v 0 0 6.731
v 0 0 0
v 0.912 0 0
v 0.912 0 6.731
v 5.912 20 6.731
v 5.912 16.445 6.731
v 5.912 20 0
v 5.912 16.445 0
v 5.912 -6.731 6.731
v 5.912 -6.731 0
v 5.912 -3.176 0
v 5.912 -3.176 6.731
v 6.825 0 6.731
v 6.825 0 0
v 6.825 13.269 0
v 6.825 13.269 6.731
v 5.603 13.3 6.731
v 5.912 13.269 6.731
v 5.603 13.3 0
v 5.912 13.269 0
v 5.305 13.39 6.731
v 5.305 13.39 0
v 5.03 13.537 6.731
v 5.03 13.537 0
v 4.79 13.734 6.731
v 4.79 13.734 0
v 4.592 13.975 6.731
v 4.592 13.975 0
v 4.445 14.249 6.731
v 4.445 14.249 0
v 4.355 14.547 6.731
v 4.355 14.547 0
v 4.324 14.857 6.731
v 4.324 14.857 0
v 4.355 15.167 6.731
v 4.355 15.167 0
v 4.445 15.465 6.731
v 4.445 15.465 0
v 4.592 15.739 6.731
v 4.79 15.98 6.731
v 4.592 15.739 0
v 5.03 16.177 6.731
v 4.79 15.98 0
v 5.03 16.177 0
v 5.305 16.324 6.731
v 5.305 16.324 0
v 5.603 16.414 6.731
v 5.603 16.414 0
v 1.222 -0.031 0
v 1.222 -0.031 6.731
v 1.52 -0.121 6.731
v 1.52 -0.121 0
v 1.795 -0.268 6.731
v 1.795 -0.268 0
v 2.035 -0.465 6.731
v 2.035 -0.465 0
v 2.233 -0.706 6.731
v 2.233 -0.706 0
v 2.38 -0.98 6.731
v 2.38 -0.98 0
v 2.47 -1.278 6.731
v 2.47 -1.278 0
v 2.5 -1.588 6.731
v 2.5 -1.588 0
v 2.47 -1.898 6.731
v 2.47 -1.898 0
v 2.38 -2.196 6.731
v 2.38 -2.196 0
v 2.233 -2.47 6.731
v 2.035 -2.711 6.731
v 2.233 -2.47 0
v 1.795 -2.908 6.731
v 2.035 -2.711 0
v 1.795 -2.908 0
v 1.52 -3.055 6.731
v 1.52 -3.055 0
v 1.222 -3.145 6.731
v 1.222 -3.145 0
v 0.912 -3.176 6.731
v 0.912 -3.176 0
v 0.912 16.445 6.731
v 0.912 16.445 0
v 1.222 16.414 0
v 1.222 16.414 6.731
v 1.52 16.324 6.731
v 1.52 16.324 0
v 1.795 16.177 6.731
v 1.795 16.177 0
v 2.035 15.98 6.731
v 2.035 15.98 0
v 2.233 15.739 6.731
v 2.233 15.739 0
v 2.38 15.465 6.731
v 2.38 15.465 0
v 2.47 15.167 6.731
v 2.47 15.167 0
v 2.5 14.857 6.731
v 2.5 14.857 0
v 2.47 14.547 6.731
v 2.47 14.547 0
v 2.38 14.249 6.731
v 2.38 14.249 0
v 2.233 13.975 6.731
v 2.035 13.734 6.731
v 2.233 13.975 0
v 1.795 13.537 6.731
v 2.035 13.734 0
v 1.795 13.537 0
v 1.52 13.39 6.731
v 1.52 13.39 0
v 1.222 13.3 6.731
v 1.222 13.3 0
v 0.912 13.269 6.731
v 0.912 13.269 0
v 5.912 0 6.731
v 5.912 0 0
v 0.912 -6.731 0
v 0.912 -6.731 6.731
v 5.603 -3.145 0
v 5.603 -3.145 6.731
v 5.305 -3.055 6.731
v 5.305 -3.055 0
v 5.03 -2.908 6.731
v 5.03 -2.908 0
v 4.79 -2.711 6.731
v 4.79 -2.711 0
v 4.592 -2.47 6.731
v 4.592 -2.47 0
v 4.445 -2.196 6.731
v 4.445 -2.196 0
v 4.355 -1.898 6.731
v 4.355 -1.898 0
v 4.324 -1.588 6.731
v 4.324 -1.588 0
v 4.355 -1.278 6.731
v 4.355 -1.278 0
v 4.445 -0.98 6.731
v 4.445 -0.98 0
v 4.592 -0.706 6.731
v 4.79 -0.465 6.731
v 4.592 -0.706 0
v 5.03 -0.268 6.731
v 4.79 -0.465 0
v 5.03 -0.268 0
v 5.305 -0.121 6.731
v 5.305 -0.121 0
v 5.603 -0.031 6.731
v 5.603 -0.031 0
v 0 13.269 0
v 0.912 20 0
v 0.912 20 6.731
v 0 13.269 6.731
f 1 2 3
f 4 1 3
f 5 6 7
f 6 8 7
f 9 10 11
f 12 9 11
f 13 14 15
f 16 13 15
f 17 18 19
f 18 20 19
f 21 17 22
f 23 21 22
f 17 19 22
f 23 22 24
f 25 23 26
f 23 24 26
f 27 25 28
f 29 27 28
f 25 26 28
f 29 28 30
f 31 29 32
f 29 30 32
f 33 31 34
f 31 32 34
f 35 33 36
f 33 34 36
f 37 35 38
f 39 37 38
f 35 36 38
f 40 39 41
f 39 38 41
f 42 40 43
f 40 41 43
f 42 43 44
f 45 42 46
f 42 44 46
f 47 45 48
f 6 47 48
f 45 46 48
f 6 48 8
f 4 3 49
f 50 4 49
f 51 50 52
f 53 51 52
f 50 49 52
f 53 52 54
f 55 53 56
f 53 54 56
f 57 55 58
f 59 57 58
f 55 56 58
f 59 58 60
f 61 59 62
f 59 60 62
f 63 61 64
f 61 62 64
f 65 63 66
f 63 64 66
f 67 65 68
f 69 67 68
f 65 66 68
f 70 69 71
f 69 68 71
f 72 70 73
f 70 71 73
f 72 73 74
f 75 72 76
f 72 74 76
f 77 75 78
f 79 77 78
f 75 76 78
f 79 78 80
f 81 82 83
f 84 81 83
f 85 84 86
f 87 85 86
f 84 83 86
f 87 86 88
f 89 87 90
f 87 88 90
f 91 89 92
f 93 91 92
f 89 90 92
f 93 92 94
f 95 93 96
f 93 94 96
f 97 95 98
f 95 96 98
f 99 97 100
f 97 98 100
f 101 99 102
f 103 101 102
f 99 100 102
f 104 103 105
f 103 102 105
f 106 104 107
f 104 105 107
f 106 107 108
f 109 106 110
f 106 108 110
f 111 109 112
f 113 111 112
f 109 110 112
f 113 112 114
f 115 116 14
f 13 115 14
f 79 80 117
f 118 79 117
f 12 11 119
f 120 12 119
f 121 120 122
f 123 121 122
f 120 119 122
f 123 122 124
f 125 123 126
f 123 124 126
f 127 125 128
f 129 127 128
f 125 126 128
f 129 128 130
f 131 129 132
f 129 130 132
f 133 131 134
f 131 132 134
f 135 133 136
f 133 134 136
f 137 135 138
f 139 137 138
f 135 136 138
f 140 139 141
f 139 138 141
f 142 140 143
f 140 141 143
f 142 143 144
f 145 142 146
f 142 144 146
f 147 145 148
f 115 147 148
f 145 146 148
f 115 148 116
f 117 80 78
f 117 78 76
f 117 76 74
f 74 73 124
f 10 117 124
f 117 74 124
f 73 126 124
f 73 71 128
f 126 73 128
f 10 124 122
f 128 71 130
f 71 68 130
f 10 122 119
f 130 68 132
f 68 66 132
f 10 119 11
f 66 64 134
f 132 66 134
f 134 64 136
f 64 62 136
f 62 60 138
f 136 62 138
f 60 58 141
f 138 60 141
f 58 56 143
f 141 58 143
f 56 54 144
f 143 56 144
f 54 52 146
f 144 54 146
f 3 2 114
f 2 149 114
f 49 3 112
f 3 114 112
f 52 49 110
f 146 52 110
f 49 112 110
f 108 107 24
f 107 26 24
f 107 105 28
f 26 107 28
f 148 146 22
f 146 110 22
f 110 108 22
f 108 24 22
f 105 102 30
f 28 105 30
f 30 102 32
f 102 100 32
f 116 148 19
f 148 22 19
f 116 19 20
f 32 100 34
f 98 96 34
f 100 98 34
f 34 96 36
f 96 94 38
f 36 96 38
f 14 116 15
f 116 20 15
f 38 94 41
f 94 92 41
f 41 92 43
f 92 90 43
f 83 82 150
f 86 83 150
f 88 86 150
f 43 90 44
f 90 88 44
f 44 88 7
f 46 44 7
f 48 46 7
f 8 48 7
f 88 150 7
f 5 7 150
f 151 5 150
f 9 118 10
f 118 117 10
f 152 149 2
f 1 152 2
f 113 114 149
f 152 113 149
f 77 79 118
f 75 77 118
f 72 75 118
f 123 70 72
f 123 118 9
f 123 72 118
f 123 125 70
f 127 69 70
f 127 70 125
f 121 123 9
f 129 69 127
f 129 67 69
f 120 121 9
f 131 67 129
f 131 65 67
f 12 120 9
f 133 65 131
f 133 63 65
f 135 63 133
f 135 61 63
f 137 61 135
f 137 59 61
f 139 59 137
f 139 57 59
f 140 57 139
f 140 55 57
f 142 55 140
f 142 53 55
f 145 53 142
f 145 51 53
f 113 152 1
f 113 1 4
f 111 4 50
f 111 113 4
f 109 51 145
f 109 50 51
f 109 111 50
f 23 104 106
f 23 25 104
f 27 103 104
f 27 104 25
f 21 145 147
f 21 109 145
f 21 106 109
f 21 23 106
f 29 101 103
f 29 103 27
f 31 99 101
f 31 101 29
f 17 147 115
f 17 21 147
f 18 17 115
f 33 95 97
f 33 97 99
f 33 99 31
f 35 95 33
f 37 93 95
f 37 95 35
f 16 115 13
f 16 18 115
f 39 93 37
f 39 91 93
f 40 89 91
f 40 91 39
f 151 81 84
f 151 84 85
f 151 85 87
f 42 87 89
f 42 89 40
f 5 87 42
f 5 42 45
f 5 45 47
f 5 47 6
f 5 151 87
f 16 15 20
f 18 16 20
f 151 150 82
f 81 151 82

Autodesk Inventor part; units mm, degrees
ref_plane "YZ Plane" through (0, 0, 0) normal (1, 0, 0) x (0, 1, 0)
ref_plane "XZ Plane" through (0, 0, 0) normal (0, 1, 0) x (-1, 0, 0)
ref_plane "XY Plane" through (0, 0, 0) normal (0, 0, 1) x (1, 0, 0)
sketch "Sketch1" plane through (0, 0, 0) normal (0, 0, 1) x (1, 0, 0)
  line L0 (0, 0) -> (0.9125, 0)
  line L1 (0.9125, 0) -> (0.9125, -6.731)
  line L2 (0.9125, -6.731) -> (5.9125, -6.731)
  line L3 (5.9125, -6.731) -> (5.9125, 0)
  line L4 (5.9125, 0) -> (6.825, 0)
  line L5 (6.825, 0) -> (6.825, 13.269)
  line L6 (6.825, 13.269) -> (5.9125, 13.269)
  line L7 (5.9125, 13.269) -> (5.9125, 20)
  line L8 (5.9125, 20) -> (0.9125, 20)
  line L9 (0.9125, 20) -> (0.9125, 13.269)
  line L10 (0.9125, 13.269) -> (0, 13.269)
  line L11 (0, 13.269) -> (0, 0)
  dimension "d0" = 5
  dimension "d1" = 13.269
  dimension "d2" = 6.731
  dimension "d3" = 6.825
extrude "Extrusion1" add sketch "Sketch1" along normal blind 6.731
sketch "Sketch3" plane through (0, 0, 0) normal (0, 0, -1) x (-1, 0, 0)
  line L0 (0, 0) -> (-0.9125, 0) projected
  line L1 (-0.9125, 13.269) -> (0, 13.269) projected
  line L2 (-0.9125, 20) -> (-0.9125, 13.269) projected
  line L3 (-5.9125, 13.269) -> (-5.9125, 20) projected
  line L4 (-6.825, 13.269) -> (-5.9125, 13.269) projected
  line L5 (-5.9125, 0) -> (-6.825, 0) projected
  line L6 (-5.9125, -6.731) -> (-5.9125, 0) projected
  line L7 (-0.9125, 0) -> (-0.9125, -6.731) projected
  arc A0 (-0.9125, 0) -> (-0.9125, -3.176) centre (-0.9125, -1.588) ccw
  arc A1 (-5.9125, -3.176) -> (-5.9125, 0) centre (-5.9125, -1.588) ccw
  arc A2 (-5.9125, 13.269) -> (-5.9125, 16.445) centre (-5.9125, 14.857) ccw
  arc A3 (-0.9125, 16.445) -> (-0.9125, 13.269) centre (-0.9125, 14.857) ccw
  dimension "d13" = 1.588
extrude "Extrusion3" cut sketch "Sketch3" against normal up to next
equation "\"d2\" = THICKB"
equation "\"d4\" = THICKB"
equation "\"THICKA\" = 3.175"
equation "\"THICKB\" = 6.731"
equation "\"THICKC\" = 12.7"
equation "\"THICKPLY\" = 5"
equation "\"MAGDIA\" = 9.5"
equation "\"BALLDIA\" = 12"
properties part number "Carriage_Joint_Boltblock_Brace"
